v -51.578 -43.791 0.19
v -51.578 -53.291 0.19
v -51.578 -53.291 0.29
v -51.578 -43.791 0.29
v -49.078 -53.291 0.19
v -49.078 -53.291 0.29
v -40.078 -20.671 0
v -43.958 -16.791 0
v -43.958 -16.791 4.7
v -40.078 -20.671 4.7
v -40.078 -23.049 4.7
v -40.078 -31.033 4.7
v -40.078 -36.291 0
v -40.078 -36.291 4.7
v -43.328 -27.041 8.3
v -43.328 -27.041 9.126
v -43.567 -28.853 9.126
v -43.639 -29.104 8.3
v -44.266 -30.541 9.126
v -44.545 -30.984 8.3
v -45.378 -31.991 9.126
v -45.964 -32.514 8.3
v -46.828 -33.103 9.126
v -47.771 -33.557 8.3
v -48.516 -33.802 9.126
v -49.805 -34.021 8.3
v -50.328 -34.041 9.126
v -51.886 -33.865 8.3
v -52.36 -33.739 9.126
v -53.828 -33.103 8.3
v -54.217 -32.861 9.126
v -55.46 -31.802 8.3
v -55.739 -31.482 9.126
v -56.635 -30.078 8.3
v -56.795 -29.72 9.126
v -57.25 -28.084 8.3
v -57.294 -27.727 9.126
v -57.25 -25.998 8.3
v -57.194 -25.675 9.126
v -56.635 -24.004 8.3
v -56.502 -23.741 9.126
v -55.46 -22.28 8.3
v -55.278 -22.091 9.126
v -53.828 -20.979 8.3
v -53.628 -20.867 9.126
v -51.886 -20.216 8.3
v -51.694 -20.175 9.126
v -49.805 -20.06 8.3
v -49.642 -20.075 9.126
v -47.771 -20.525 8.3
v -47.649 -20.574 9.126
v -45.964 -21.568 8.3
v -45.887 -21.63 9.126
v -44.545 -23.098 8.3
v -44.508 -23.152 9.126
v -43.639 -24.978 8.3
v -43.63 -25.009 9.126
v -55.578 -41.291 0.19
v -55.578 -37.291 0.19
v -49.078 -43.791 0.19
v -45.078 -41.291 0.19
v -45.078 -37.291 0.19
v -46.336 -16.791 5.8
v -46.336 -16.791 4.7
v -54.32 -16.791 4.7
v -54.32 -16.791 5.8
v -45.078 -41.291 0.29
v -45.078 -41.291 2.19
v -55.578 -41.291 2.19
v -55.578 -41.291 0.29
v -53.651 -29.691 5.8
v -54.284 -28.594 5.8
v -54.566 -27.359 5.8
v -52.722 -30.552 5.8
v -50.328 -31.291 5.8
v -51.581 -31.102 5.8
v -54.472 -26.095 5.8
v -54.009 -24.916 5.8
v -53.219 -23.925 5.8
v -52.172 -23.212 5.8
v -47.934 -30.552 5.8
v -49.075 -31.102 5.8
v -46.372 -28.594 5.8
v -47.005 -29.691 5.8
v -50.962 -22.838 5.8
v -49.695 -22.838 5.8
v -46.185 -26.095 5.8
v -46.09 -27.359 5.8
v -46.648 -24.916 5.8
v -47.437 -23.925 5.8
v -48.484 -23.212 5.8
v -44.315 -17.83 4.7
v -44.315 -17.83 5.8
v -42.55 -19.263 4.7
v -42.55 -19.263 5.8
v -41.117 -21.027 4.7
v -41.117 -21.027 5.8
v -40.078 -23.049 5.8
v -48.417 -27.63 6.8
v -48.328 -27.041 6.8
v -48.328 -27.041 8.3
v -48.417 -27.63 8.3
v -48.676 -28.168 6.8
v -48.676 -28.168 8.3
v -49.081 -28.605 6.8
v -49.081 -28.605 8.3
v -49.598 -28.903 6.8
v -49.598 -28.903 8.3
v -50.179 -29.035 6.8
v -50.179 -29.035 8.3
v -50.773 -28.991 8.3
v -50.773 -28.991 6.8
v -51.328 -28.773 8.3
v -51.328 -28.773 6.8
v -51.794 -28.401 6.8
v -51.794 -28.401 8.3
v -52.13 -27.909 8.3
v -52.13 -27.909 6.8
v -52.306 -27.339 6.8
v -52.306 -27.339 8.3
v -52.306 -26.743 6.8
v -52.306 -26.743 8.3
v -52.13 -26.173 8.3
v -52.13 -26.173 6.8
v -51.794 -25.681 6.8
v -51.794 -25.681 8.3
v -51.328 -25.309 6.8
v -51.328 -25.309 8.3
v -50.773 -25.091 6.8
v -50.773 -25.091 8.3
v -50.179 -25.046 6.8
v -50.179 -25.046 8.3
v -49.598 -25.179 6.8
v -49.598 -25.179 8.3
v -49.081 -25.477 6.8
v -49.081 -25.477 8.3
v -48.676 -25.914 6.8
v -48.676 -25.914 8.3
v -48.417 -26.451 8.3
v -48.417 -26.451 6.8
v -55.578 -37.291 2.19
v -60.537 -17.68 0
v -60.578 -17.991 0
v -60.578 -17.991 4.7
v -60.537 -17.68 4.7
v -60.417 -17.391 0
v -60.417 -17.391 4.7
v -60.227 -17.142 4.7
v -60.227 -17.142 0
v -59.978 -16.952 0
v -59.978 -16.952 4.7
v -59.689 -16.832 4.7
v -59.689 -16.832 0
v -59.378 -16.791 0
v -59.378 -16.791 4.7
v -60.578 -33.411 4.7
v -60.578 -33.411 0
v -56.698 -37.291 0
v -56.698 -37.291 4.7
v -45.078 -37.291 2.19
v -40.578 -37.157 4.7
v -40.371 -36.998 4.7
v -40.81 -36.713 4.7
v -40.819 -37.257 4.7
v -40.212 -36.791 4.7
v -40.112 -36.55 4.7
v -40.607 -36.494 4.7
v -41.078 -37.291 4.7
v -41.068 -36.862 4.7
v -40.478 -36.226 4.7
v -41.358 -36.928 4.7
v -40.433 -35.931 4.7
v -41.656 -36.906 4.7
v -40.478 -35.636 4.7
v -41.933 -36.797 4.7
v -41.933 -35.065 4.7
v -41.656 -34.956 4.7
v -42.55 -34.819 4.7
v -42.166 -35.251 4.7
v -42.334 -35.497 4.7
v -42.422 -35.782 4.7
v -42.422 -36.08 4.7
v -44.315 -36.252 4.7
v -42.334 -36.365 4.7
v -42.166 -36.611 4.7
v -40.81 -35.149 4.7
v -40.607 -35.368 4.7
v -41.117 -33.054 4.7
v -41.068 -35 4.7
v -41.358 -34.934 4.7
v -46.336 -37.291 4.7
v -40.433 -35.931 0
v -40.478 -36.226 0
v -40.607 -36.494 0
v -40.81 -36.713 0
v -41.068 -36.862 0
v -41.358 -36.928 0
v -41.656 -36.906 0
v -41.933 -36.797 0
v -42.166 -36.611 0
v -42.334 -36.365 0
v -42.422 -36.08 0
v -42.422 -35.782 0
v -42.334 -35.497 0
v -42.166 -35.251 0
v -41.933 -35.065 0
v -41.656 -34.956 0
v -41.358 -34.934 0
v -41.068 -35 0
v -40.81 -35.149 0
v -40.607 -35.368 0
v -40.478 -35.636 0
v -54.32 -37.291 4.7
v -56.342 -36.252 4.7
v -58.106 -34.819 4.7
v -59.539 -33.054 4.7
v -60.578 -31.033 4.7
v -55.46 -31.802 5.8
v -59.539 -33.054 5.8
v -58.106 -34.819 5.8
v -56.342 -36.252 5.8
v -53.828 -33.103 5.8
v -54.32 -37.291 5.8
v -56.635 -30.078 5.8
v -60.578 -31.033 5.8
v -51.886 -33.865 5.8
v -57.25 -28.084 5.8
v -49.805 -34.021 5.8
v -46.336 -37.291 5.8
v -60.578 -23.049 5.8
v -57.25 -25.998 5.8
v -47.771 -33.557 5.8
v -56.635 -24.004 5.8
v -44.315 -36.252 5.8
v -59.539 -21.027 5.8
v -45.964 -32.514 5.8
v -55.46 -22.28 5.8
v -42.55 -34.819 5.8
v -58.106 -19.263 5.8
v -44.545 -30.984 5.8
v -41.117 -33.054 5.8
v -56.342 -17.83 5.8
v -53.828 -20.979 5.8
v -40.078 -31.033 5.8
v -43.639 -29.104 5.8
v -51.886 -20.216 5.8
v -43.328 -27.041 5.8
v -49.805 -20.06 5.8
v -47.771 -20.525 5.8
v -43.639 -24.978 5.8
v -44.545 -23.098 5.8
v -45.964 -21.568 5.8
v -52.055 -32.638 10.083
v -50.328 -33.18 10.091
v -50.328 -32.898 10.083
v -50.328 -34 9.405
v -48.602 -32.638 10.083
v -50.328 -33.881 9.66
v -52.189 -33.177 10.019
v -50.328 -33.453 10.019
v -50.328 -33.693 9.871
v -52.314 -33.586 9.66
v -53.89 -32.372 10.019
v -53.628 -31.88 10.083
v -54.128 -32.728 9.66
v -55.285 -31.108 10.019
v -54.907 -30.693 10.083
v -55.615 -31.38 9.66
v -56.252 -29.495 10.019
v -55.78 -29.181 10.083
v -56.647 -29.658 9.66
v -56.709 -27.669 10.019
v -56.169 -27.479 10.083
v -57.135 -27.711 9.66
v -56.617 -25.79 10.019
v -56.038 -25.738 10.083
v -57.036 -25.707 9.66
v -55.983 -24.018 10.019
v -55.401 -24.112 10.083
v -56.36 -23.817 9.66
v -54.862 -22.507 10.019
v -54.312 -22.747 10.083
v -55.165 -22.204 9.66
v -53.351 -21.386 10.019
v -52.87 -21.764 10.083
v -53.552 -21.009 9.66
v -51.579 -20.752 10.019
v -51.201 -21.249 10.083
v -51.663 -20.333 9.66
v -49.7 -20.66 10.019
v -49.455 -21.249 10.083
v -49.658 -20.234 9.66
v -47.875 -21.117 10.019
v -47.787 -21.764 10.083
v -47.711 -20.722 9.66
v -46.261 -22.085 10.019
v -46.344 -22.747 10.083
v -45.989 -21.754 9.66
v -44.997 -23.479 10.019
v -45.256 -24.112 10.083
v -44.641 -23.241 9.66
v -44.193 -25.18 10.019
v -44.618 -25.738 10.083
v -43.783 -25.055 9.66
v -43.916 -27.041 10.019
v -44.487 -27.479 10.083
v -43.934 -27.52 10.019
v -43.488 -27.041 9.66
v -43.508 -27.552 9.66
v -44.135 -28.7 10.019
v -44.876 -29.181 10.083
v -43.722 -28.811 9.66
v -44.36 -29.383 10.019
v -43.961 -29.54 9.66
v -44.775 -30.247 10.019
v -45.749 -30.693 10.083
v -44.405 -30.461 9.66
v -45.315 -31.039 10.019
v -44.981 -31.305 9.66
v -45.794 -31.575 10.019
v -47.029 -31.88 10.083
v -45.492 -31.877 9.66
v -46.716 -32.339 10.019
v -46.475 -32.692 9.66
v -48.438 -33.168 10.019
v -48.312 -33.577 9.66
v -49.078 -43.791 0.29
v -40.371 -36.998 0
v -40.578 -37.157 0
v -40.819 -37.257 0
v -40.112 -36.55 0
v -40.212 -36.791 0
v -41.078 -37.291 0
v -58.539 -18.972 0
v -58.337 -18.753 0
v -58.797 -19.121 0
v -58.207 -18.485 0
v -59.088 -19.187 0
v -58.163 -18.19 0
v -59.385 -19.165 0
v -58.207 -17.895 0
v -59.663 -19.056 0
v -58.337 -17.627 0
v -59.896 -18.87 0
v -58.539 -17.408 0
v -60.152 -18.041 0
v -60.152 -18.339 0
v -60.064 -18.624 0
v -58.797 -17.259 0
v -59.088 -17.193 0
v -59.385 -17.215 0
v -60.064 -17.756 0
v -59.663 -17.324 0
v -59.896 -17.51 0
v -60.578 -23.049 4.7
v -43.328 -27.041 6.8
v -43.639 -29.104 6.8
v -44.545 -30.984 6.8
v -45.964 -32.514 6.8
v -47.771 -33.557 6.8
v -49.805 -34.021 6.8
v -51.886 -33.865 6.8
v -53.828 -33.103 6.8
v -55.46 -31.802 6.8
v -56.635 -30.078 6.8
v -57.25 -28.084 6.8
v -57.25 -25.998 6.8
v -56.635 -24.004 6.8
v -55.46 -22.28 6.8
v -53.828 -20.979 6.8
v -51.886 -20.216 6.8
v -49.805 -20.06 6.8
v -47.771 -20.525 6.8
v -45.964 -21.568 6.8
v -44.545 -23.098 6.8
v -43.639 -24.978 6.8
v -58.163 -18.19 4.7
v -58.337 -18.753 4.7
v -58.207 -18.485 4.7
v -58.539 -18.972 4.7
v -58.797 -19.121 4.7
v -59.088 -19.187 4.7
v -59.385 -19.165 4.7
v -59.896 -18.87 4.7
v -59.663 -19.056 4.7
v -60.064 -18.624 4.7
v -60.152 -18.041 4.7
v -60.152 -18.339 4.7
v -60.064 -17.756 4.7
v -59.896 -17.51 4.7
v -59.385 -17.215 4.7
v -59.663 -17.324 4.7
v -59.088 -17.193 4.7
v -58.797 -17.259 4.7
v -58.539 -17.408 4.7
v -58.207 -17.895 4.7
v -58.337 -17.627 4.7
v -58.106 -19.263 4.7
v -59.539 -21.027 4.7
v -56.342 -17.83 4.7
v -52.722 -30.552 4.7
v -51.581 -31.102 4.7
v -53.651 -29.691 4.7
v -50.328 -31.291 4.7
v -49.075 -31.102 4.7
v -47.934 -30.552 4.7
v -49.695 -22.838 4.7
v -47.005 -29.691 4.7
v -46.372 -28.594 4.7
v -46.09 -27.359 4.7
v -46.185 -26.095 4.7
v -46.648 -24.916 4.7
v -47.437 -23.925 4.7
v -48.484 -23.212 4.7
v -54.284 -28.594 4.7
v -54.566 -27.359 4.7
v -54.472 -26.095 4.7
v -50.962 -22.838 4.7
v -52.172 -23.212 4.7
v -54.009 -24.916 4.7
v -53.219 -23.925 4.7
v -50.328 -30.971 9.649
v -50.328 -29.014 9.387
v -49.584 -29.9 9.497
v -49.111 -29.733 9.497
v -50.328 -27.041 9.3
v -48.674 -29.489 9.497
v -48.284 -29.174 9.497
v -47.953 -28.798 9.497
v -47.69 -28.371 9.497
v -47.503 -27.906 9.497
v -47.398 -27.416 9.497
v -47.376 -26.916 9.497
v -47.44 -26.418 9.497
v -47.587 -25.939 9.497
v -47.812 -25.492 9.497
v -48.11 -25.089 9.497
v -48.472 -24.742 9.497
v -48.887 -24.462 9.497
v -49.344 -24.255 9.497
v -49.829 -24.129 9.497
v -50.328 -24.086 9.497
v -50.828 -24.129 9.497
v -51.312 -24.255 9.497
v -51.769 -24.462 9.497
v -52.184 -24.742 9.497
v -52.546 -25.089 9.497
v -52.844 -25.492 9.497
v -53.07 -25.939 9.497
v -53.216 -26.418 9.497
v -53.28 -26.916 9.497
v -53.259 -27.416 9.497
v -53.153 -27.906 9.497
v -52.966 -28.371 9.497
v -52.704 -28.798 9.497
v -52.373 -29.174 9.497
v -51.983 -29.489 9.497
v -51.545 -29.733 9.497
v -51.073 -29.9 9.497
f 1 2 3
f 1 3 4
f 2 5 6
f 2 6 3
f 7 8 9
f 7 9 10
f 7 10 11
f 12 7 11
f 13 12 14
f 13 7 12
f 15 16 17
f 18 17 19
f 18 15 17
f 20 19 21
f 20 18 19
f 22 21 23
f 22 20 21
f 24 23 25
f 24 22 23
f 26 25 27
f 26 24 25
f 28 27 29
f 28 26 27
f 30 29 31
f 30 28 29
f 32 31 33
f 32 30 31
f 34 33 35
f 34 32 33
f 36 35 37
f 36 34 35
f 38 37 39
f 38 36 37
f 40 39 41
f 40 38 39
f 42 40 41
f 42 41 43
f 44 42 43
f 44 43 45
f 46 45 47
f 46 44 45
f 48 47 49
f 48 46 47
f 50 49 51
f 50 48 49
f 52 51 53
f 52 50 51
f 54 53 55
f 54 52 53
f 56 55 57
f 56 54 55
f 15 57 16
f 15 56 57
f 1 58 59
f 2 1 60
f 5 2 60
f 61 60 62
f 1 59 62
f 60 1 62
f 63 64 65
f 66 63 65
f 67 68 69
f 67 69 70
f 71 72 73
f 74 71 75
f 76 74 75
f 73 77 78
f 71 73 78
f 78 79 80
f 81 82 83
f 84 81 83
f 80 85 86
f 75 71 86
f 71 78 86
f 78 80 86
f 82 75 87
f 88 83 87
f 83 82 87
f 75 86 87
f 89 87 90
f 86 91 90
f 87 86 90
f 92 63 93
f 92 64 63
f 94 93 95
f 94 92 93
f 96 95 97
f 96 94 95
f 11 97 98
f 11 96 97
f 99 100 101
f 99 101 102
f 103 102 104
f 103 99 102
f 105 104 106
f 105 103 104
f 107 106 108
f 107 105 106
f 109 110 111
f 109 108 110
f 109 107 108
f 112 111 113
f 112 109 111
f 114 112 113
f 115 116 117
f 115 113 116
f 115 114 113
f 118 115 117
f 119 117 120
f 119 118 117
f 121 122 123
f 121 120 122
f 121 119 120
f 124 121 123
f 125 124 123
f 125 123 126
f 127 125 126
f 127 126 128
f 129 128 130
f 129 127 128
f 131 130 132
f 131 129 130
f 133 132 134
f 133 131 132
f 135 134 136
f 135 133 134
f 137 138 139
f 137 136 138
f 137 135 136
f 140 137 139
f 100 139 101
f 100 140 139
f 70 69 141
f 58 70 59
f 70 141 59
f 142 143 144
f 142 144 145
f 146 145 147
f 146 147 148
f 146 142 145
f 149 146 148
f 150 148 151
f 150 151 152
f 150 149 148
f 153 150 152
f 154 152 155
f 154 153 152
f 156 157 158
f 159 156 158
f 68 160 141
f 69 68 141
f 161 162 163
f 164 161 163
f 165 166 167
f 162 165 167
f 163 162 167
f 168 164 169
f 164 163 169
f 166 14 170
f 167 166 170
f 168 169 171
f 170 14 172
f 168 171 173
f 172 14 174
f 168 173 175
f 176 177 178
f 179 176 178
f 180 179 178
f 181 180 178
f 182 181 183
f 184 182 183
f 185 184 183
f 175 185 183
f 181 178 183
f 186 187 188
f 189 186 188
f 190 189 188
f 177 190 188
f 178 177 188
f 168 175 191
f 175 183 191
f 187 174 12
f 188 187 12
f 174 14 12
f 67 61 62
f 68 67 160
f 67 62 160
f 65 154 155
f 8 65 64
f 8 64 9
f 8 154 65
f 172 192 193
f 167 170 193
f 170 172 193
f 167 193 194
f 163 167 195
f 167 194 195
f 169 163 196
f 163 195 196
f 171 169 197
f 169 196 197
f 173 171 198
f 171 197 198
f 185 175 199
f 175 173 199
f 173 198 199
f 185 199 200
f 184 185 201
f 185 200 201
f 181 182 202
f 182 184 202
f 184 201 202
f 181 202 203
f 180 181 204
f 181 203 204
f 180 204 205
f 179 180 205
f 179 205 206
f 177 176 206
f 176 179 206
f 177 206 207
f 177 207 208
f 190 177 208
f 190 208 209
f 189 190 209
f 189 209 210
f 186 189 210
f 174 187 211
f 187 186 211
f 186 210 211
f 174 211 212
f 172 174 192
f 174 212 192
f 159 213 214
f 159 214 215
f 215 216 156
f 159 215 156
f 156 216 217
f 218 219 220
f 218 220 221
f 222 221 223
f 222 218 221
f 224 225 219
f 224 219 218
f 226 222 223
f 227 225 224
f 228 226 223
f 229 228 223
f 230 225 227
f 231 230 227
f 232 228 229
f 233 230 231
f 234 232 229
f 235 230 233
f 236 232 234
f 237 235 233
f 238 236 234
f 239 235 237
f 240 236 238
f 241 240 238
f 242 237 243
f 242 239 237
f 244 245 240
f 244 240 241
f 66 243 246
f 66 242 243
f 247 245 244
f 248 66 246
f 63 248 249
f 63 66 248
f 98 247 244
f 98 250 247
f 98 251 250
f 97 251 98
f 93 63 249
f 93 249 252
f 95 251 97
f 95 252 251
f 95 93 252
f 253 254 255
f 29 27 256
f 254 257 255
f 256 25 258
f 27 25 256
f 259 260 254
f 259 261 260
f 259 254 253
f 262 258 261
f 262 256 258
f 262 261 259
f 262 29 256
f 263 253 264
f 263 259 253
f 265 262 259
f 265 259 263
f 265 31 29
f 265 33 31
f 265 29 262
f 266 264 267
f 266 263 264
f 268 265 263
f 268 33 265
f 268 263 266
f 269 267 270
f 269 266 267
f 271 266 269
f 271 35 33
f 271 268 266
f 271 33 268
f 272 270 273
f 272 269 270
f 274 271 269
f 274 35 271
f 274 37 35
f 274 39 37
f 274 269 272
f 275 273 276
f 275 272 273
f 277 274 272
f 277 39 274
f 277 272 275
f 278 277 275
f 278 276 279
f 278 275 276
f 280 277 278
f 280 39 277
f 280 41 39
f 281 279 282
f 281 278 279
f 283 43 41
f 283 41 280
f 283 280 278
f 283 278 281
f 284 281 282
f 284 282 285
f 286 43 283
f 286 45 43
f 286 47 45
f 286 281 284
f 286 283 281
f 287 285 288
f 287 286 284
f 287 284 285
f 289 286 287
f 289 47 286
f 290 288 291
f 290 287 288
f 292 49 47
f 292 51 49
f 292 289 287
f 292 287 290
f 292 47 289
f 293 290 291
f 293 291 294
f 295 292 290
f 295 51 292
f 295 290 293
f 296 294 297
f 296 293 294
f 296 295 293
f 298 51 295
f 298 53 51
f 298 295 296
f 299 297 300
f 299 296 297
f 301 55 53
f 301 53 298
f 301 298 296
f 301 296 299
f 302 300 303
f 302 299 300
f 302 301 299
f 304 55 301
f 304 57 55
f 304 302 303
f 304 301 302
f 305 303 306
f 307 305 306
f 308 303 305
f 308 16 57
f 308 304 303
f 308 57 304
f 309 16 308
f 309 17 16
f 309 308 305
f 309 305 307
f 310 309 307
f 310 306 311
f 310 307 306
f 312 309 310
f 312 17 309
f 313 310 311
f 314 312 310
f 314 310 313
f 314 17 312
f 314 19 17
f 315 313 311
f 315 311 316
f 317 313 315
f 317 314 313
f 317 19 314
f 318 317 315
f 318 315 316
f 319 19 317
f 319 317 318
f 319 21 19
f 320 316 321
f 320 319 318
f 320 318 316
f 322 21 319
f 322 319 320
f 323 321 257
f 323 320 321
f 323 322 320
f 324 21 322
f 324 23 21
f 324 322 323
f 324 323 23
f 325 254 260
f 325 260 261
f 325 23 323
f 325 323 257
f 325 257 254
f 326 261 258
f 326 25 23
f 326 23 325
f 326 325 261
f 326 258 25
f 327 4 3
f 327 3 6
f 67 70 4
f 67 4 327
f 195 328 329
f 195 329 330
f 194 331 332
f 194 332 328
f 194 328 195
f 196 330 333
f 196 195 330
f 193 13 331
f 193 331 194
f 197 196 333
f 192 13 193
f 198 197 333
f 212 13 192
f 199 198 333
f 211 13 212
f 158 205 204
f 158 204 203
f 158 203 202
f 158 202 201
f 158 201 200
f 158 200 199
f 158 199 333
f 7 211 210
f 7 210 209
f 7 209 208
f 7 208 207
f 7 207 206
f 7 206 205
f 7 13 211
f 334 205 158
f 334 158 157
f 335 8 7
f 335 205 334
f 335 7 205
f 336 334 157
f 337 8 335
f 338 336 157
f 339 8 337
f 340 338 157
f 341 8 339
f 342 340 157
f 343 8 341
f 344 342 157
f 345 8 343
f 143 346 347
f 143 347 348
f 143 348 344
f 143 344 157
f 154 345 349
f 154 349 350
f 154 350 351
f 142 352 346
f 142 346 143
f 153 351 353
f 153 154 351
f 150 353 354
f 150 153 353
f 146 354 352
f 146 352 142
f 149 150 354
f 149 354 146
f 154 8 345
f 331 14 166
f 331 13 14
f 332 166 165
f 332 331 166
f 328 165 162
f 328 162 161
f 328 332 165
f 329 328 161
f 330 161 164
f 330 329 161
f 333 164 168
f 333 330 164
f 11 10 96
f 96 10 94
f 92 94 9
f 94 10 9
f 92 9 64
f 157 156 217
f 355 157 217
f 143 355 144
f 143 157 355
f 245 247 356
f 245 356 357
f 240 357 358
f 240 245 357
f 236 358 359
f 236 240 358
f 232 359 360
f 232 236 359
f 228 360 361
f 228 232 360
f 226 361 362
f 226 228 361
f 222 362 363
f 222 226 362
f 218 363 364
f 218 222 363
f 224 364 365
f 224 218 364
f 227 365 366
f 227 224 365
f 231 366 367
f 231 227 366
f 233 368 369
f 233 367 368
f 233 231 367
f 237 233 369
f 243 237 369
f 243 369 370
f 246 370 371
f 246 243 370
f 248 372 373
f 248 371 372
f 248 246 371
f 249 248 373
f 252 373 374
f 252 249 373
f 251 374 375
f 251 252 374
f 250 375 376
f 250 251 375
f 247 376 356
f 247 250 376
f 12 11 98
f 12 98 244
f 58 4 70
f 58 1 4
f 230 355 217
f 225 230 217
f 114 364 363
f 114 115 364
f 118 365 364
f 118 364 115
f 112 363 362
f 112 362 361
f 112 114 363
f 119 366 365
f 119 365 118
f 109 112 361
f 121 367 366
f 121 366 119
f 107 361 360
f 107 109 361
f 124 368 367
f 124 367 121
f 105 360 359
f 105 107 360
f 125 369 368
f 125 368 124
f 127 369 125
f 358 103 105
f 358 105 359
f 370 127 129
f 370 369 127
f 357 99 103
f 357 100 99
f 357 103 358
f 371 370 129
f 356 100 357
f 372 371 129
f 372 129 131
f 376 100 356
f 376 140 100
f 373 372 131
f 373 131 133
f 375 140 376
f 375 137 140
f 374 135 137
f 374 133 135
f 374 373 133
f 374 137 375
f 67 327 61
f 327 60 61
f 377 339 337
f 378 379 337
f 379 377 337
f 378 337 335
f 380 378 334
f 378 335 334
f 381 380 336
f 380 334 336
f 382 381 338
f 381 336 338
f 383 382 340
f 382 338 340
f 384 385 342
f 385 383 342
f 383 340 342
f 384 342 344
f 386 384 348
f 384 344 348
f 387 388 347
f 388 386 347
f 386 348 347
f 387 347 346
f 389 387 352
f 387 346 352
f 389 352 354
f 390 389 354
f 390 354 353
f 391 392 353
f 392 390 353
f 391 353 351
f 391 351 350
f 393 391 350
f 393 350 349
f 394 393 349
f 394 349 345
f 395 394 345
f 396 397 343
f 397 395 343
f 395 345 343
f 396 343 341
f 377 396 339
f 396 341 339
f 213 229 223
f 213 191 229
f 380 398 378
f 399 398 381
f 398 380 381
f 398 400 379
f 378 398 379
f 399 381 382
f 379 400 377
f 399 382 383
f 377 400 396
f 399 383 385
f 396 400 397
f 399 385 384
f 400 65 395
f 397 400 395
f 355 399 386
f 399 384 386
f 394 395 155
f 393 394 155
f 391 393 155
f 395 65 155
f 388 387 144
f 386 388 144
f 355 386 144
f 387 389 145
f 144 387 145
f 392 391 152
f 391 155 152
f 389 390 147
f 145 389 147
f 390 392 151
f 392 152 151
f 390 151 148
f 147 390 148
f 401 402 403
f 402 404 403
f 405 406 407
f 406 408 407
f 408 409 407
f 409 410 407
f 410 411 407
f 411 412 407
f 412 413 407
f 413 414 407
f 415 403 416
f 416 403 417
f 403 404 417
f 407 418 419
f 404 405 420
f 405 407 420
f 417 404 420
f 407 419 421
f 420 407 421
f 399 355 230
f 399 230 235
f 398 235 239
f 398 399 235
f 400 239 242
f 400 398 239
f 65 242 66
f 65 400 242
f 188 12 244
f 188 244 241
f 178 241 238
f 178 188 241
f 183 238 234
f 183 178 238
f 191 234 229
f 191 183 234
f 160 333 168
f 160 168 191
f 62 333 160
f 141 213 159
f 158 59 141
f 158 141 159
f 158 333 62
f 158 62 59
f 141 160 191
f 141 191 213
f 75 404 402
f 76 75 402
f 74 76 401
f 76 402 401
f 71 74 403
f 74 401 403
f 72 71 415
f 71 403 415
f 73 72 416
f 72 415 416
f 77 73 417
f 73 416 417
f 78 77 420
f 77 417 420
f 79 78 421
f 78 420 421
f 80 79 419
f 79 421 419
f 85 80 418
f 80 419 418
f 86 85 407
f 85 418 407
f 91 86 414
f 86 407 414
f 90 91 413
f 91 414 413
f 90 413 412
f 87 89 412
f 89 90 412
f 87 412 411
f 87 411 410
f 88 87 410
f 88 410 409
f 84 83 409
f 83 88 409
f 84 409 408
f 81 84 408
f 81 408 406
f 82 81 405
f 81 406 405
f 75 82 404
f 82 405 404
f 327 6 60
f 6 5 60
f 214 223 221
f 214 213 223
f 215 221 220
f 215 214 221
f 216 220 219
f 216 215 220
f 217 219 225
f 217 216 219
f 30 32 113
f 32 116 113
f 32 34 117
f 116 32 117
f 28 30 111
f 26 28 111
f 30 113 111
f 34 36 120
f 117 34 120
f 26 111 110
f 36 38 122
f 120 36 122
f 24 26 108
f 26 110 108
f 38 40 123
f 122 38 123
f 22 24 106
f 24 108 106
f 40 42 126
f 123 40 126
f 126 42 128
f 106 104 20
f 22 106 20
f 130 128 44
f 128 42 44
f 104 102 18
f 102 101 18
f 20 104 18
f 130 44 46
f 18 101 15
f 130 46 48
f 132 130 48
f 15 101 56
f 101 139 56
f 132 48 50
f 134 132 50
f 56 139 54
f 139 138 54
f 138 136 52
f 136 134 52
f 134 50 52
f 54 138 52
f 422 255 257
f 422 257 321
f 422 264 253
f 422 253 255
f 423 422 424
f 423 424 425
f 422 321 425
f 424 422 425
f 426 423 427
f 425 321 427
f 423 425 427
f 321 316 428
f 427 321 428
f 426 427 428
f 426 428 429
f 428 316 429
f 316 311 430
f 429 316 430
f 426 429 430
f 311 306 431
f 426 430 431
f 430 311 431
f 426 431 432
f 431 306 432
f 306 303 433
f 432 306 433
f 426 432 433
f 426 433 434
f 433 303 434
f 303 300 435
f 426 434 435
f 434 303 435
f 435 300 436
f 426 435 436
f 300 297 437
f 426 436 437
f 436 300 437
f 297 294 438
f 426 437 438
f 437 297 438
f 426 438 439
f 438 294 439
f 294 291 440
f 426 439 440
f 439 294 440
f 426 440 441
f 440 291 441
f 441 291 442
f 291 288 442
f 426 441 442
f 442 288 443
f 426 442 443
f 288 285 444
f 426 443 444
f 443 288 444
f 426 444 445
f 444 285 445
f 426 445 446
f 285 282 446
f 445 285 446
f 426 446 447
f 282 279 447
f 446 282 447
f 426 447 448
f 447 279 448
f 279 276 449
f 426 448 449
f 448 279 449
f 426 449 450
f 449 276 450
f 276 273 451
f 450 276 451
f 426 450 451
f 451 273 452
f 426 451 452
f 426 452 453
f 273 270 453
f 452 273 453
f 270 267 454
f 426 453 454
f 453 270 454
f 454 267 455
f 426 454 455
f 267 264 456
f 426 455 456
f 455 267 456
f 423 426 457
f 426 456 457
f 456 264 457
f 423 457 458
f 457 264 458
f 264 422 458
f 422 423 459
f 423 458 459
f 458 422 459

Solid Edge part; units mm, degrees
sketch "Sketch1" plane through (0, 0, 0) normal (0, 0, 1) x (1, 0, 0)
  circle A0 centre (-59.1628, -18.1899) radius 1
  line L0 (-40.0782, -20.6709) -> (-40.0782, -36.2909)
  arc A1 (-40.0782, -36.2909) -> (-41.0782, -37.2909) centre (-41.0782, -36.2909) cw
  line L1 (-41.0782, -37.2909) -> (-56.6982, -37.2909)
  line L2 (-60.5782, -33.4109) -> (-56.6982, -37.2909)
  line L3 (-60.5782, -33.4109) -> (-60.5782, -17.9909)
  arc A2 (-60.5782, -17.9909) -> (-59.3782, -16.7909) centre (-59.3782, -17.9909) cw
  line L4 (-59.3782, -16.7909) -> (-43.9582, -16.7909)
  line L5 (-43.9582, -16.7909) -> (-40.0782, -20.6709)
  circle A3 centre (-41.4332, -35.9309) radius 1
extrude "Protrusion1" add sketch "Sketch1" along normal blind 4.7
sketch "Sketch2" plane through (-50.3282, -27.0409, 4.7) normal (0, 0, 1) x (0, -1, 0)
  circle A0 centre (0, 0) radius 4.25
  arc A1 (-10.25, -3.9922) -> (-3.9922, -10.25) centre (0, 0) ccw
  line L0 (-3.9922, -10.25) -> (3.9922, -10.25)
  arc A2 (3.9922, -10.25) -> (10.25, -3.9922) centre (0, 0) ccw
  line L1 (10.25, 3.9922) -> (10.25, -3.9922)
  arc A3 (3.9922, 10.25) -> (10.25, 3.9922) centre (0, 0) cw
  line L2 (-3.9922, 10.25) -> (3.9922, 10.25)
  arc A4 (-3.9922, 10.25) -> (-10.25, 3.9922) centre (0, 0) ccw
  line L3 (-10.25, 3.9922) -> (-10.25, -3.9922)
extrude "ExtrudedProtrusion_2" add sketch "Sketch2" along normal blind 1.1
sketch "Sketch3" plane through (-50.3282, -27.0409, 5.8) normal (0, 0, 1) x (1, 0, 0)
  circle A0 centre (0, 0) radius 7
extrude "ExtrudedProtrusion_3" add sketch "Sketch3" along normal blind 1
sketch "Sketch4" plane through (-50.3282, -27.0409, 6.8) normal (0, 0, 1) x (1, 0, 0)
  circle A0 centre (0, 0) radius 2
extrude "ExtrudedProtrusion_4" add sketch "Sketch4" along normal blind 1.5
sketch "Sketch5" plane through (-50.3282, -27.0409, 8.3) normal (0, 0, 1) x (1, 0, 0)
  circle A0 centre (0, 0) radius 7
extrude "ExtrudedProtrusion_5" add sketch "Sketch5" along normal blind 2
sketch "Sketch6" plane through (-50.3282, 0, 0) normal (1, 0, 0) x (0, 1, 0)
  line L0 (-34.0409, 10.3) -> (-27.0409, 10.3)
  line L1 (-27.0409, 10.3) -> (-27.0409, 4.8545)
  arc A0 (-27.0409, 9.3) -> (-32.898, 10.0828) centre (-27.0409, 31.604) cw
  arc A1 (-32.898, 10.0828) -> (-34.0409, 9.1255) centre (-33.0685, 9.1255) ccw
  line L2 (-34.0409, 10.3) -> (-34.0409, 9.1255)
revolve "RevolvedCutout1" cut sketch "Sketch6" angle 360 about axis through (-50.3282, -27.0409, 10.3) along (0, 0, -1)
sketch "Sketch7" plane through (-48.8882, -37.2909, 2.9) normal (0, -1, 0) x (1, 0, 0)
  line L0 (-6.69, -0.7104) -> (-6.69, -2.7104)
  line L1 (-6.69, -2.7104) -> (3.81, -2.7104)
  line L2 (3.81, -2.7104) -> (3.81, -0.7104)
  line L3 (3.81, -0.7104) -> (-6.69, -0.7104)
extrude "ExtrudedProtrusion_6" add sketch "Sketch7" along normal blind 4
sketch "Sketch8" plane through (-50.3282, -39.2909, 0.1896) normal (0, 0, -1) x (0, -1, 0)
  line L0 (14, -1.25) -> (4.5, -1.25)
  line L1 (4.5, -1.25) -> (2, -5.25)
  line L2 (2, 5.25) -> (2, -5.25)
  line L3 (4.5, 1.25) -> (2, 5.25)
  line L4 (14, 1.25) -> (4.5, 1.25)
  line L5 (14, 0) -> (14, 1.25)
  line L6 (14, 0) -> (14, -1.25)
extrude "ExtrudedProtrusion_7" add sketch "Sketch8" against normal blind 0.1
